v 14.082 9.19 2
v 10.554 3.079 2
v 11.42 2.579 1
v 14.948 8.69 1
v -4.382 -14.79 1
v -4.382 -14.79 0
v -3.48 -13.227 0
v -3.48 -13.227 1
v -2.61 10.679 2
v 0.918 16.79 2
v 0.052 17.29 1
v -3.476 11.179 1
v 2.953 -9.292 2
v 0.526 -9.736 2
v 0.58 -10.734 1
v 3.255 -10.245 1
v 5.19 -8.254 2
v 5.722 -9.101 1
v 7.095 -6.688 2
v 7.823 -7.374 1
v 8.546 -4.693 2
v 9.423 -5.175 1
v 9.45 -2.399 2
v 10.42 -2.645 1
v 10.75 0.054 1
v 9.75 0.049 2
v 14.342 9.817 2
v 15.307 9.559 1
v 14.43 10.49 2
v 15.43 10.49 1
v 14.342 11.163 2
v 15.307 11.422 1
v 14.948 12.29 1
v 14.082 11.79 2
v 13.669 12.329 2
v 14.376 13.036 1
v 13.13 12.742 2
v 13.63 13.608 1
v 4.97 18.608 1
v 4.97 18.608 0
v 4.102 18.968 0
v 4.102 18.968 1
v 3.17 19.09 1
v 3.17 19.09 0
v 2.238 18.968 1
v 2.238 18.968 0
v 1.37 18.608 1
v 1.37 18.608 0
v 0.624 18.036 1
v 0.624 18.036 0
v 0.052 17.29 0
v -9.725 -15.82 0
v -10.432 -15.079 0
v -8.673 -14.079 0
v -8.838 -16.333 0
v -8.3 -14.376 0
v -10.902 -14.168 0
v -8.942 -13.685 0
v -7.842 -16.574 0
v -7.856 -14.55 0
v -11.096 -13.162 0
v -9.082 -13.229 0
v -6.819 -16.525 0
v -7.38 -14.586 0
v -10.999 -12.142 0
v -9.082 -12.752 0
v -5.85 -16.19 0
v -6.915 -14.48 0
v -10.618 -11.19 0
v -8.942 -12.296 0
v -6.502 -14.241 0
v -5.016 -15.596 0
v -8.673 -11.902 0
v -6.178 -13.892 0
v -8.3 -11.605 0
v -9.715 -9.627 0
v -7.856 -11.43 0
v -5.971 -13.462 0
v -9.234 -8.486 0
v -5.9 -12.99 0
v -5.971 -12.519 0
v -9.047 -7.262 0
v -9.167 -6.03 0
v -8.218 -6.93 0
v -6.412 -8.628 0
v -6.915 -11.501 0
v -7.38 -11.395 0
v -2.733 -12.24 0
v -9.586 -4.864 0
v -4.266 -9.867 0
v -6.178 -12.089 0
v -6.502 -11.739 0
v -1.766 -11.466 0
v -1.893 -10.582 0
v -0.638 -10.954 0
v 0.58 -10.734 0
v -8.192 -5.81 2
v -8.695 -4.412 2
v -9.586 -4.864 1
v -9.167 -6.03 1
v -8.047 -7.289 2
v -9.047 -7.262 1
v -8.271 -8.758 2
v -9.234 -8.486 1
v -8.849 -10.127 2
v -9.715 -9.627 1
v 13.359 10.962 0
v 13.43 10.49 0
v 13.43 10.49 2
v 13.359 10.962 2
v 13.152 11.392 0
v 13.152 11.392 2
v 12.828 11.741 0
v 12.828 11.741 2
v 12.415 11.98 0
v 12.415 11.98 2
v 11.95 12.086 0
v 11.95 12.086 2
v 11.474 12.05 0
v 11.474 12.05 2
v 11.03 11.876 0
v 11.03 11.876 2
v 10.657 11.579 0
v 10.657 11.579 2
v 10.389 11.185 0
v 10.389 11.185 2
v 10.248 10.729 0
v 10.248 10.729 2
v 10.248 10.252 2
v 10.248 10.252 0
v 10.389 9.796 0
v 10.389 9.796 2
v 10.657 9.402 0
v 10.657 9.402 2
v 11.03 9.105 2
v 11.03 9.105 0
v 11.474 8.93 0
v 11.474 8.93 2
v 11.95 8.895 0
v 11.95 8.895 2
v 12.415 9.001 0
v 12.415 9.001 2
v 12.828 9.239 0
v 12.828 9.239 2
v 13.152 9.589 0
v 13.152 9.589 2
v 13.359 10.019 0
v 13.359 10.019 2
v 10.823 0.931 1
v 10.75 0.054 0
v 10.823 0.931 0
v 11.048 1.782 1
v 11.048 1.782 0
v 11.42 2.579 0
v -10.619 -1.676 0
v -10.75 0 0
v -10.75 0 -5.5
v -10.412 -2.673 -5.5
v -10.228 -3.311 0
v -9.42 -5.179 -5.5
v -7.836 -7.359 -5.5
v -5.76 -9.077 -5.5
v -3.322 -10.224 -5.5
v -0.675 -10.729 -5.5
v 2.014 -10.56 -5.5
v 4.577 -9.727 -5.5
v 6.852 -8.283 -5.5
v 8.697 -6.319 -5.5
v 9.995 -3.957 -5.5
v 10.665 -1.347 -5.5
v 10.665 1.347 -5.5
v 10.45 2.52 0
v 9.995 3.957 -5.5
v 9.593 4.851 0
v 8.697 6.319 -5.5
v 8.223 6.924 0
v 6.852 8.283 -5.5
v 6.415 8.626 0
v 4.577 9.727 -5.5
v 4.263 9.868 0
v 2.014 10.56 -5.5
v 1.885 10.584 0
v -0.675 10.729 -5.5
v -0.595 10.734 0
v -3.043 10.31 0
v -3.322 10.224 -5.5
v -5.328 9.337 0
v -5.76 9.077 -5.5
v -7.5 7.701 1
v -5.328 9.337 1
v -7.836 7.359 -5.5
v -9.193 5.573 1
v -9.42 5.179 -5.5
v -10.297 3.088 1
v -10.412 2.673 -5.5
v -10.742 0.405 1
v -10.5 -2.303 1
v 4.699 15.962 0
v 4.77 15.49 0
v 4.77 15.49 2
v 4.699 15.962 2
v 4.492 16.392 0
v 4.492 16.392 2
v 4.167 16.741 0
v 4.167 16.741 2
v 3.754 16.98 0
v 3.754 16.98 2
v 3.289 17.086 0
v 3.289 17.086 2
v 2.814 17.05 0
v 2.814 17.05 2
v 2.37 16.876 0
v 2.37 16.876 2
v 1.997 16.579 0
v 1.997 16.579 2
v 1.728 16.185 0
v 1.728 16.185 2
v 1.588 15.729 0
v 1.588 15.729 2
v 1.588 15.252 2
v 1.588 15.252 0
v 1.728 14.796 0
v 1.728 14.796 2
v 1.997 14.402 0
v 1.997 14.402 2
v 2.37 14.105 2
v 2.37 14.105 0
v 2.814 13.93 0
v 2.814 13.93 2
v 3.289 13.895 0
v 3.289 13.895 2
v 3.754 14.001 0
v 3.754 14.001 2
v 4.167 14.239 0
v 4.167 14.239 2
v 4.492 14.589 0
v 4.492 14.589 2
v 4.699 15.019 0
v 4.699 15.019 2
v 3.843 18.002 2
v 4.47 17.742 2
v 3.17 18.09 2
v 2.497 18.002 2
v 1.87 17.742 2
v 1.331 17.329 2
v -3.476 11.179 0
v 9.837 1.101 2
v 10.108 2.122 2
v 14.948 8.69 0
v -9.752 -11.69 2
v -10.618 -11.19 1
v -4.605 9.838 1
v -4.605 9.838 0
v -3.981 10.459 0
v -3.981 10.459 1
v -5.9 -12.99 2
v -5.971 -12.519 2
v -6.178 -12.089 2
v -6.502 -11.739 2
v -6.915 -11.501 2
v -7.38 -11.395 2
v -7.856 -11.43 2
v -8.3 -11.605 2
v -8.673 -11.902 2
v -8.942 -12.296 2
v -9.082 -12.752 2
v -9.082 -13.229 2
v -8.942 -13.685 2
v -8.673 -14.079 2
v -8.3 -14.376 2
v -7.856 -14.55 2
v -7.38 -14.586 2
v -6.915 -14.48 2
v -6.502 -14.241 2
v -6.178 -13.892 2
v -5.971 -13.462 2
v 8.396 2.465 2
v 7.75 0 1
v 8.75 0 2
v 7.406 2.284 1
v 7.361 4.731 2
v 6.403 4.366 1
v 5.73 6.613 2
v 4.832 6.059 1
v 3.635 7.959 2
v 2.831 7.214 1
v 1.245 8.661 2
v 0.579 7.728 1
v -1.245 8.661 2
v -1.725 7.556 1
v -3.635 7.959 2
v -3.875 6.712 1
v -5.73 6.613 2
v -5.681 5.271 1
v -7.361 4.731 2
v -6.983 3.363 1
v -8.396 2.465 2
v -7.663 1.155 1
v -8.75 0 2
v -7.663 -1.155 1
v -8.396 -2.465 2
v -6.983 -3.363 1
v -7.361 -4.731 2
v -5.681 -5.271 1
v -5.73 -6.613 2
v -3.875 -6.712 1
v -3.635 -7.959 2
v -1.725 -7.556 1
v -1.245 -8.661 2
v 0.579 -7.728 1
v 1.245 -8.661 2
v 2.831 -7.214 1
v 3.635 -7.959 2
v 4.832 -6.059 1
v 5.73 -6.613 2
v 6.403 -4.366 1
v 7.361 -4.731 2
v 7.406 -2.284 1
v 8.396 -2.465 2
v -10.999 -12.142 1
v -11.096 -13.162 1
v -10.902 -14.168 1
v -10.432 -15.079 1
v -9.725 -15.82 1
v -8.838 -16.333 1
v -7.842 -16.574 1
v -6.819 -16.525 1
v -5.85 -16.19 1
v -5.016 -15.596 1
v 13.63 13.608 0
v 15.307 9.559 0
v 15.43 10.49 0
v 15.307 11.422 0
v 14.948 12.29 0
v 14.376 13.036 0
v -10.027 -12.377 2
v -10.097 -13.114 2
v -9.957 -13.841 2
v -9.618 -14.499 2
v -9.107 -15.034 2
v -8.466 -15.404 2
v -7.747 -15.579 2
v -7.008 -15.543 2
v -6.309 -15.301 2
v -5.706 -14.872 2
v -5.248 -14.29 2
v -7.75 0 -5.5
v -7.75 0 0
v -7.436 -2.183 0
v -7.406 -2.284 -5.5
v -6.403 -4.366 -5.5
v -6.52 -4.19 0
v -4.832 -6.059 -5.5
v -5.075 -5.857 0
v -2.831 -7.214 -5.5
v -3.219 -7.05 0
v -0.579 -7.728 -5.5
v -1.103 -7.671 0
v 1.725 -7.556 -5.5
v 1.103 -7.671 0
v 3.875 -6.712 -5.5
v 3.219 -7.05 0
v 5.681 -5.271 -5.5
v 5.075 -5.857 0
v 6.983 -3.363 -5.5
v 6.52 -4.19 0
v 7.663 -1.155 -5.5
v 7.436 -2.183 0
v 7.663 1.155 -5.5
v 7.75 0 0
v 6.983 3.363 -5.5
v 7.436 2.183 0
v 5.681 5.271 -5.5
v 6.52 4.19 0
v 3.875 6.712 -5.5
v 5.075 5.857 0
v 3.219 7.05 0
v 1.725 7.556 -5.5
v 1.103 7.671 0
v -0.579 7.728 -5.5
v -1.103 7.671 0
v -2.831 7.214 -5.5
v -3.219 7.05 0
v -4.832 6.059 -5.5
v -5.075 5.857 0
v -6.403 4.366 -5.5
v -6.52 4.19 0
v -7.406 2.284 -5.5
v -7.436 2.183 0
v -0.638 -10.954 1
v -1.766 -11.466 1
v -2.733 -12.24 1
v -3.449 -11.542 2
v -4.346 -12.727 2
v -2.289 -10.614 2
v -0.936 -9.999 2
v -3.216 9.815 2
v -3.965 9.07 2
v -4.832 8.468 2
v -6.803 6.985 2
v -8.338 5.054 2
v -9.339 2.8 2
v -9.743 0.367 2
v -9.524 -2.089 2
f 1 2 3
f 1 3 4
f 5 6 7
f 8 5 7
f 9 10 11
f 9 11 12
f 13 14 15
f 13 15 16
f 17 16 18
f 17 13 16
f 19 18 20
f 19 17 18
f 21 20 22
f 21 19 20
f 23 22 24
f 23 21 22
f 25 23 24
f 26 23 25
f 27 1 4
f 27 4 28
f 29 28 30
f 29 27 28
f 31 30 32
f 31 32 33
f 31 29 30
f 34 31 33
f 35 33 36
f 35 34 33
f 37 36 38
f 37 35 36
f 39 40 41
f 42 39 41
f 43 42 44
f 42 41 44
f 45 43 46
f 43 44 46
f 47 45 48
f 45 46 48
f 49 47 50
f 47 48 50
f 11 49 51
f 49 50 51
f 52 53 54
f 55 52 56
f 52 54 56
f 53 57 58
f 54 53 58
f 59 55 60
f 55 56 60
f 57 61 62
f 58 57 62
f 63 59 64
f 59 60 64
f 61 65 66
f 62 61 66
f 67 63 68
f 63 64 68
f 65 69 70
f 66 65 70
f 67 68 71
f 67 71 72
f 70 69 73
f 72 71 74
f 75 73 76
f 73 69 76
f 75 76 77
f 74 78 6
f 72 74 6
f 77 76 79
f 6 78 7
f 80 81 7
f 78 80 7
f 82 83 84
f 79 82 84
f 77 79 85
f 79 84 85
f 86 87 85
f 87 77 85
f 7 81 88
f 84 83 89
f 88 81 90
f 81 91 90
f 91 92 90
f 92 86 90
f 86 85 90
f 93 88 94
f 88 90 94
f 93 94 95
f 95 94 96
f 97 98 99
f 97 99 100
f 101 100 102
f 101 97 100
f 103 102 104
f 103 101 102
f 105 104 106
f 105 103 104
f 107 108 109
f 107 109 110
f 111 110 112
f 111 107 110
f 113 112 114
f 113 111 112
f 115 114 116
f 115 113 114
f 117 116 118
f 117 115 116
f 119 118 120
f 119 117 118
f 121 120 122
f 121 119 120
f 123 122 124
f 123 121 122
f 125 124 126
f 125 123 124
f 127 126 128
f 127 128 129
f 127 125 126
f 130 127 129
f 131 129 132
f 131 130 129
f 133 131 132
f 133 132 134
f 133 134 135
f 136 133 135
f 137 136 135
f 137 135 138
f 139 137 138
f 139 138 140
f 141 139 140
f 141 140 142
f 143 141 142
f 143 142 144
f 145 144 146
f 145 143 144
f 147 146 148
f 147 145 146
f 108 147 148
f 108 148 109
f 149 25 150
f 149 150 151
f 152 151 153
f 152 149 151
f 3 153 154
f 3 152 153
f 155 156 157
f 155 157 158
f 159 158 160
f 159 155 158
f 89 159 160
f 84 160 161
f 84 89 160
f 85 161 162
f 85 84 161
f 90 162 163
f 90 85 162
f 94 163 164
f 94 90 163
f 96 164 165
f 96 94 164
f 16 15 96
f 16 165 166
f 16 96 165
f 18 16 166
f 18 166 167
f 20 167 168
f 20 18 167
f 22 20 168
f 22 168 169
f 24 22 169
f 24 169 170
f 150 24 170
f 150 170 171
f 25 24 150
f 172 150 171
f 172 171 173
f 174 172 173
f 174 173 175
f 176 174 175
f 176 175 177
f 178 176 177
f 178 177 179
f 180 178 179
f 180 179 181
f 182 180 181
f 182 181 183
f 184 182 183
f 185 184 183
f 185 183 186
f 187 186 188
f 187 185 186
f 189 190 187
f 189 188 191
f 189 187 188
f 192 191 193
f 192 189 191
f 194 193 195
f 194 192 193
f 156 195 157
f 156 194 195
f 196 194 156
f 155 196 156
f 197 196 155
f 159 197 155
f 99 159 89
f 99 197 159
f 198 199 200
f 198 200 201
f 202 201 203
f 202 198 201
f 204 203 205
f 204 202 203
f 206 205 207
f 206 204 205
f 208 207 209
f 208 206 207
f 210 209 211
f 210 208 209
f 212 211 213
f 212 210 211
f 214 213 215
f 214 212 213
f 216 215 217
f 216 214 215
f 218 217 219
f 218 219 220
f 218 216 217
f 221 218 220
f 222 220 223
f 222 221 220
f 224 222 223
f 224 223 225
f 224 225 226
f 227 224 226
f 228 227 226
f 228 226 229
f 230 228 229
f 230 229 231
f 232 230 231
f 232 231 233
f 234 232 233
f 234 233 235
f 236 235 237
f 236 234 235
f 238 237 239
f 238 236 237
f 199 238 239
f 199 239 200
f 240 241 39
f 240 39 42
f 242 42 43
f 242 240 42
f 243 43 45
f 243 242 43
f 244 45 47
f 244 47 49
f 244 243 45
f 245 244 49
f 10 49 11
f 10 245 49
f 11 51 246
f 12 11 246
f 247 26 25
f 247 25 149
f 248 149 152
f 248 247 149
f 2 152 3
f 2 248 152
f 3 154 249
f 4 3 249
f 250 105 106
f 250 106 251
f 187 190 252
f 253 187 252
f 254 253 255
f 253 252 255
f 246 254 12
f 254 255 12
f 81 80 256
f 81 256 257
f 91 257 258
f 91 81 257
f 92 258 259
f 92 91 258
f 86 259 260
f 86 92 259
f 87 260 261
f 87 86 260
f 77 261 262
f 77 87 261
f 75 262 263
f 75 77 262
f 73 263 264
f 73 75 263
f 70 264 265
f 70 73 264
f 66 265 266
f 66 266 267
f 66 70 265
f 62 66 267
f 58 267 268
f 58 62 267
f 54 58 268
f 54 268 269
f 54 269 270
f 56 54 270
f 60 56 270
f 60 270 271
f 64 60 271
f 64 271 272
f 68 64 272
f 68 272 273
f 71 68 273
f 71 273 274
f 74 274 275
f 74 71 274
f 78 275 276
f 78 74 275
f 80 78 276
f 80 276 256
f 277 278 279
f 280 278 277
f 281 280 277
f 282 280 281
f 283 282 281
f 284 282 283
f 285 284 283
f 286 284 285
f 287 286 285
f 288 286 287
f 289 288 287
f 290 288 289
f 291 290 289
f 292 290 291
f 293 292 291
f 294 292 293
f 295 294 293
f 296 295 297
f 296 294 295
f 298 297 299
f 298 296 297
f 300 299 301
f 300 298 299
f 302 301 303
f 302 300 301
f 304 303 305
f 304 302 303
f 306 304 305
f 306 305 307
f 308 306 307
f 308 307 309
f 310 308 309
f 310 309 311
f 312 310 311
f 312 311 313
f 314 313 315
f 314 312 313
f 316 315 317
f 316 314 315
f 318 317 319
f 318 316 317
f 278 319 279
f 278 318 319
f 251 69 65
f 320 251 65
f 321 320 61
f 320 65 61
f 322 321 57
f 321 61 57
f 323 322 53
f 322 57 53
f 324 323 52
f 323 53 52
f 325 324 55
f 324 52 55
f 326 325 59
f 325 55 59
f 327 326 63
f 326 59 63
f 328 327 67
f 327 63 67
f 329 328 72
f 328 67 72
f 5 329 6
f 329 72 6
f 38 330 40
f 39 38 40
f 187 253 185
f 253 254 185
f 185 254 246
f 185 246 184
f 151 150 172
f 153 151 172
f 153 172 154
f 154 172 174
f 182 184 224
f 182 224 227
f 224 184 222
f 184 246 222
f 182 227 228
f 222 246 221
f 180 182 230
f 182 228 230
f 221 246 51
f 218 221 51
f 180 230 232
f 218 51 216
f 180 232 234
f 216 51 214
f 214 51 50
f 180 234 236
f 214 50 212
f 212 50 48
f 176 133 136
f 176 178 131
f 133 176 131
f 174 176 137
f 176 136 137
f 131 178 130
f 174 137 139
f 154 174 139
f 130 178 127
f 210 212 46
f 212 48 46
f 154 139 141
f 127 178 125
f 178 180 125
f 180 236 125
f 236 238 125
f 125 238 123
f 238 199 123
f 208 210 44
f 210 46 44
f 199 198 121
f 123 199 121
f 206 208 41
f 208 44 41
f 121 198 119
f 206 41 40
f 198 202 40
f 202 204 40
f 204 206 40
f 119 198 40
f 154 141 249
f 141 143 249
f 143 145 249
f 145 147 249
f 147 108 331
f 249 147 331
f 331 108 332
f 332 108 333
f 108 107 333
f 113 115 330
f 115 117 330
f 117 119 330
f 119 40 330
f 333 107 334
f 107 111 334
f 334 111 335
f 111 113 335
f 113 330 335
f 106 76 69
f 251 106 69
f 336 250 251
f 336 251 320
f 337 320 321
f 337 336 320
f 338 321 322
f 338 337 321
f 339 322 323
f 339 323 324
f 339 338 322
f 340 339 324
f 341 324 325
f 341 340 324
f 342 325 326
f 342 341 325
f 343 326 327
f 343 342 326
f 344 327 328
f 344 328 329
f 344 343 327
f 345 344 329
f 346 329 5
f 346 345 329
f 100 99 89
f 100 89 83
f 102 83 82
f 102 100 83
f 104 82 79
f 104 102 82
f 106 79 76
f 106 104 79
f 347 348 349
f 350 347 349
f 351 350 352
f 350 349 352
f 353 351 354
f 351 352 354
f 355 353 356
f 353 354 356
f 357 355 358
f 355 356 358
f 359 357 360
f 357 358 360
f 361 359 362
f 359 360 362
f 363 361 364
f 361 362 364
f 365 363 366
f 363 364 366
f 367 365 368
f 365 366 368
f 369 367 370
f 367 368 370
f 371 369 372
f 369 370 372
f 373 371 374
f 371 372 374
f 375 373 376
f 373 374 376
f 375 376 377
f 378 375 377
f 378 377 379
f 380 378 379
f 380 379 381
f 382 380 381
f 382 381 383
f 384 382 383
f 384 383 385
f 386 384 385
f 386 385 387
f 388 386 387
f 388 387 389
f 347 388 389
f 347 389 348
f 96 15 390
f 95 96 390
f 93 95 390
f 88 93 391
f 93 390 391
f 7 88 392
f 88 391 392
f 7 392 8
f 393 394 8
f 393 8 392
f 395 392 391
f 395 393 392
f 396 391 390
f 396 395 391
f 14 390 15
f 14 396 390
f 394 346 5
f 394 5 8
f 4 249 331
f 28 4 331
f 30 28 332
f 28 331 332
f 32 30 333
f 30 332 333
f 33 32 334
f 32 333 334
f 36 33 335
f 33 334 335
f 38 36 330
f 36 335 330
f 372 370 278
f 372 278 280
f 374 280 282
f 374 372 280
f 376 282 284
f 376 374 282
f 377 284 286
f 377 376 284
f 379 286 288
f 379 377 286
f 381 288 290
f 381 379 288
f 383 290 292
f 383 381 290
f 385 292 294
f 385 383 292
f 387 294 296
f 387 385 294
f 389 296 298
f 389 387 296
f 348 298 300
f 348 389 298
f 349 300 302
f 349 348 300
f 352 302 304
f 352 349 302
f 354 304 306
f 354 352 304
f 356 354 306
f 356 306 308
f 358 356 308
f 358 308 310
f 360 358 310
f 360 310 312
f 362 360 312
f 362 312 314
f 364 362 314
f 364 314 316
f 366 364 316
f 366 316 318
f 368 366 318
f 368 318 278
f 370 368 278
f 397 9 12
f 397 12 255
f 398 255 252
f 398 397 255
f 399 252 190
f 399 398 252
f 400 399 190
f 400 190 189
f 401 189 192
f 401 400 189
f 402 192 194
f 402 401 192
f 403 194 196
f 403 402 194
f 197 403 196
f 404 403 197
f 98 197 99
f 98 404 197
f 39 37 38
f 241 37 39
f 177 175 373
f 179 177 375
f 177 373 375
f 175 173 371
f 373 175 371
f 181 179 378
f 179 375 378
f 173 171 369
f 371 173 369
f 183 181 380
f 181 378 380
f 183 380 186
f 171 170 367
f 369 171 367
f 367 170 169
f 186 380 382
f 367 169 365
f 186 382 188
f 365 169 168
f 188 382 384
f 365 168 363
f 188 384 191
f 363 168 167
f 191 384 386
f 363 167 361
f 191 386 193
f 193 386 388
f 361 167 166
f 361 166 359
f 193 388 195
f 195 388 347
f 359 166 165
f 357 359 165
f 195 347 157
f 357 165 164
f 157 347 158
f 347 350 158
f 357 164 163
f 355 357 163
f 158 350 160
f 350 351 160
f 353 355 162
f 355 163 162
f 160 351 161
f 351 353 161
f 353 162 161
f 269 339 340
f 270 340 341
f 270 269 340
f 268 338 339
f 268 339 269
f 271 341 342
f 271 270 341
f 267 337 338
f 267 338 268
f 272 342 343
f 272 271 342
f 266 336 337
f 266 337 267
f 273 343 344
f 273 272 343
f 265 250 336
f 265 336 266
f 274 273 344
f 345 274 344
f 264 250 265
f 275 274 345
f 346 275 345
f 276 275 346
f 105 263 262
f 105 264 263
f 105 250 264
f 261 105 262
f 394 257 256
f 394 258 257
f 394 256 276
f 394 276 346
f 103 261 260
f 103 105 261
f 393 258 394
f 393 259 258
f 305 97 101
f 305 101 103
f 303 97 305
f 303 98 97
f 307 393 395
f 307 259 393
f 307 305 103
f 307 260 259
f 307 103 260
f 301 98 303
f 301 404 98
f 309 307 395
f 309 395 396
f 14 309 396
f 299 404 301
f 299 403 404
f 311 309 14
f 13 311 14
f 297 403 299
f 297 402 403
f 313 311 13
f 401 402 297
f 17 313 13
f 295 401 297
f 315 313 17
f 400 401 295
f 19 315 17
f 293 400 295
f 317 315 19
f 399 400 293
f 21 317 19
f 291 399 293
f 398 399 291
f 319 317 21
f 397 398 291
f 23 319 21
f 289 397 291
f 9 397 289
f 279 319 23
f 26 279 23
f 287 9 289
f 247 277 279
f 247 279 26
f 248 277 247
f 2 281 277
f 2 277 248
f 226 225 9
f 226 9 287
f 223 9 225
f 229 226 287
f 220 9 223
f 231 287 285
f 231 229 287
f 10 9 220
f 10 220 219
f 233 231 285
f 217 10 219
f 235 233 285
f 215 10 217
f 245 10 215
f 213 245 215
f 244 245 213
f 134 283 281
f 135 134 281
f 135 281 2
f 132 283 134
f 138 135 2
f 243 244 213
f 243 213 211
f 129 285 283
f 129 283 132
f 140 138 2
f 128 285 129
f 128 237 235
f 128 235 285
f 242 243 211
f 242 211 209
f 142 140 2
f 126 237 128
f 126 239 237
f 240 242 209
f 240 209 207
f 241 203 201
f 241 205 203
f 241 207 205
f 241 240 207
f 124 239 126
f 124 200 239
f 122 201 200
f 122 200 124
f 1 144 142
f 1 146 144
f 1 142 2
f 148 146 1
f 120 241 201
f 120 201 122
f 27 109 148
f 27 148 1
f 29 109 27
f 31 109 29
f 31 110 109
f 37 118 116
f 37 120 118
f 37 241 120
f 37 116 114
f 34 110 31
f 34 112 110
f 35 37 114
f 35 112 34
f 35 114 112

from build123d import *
from build123d.topology import SkipClean

# Parameters (mm, degrees)
SKETCH1_R           = 1.6
SKETCH1_R_2         = 10.75
SKETCH1_R_3         = 7.75
BOSS_EXTRUDE1_DEPTH = 2
SKETCH1_3_R         = 10.75
SKETCH1_3_R_2       = 7.75
BOSS_EXTRUDE2_DEPTH = 5.5
FILLET1_R           = 5
CHAMFER1_SIZE       = 1


with BuildPart() as part:
    # Sketch1 → Boss-Extrude1 (new body)
    with BuildSketch(Plane.XY):
        with BuildLine():
            ThreePointArc((-1.946953154, -10.572221782), (-5.375, -9.309773091), (-8.182336061, -6.972221782))
            Line((-8.182336061, -6.972221782), (-10.617691454, -11.190381057))
            ThreePointArc((-10.617691454, -11.190381057), (-9.3, -16.10807251), (-4.382308546, -14.790381057))
            Line((-4.382308546, -14.790381057), (-1.946953154, -10.572221782))
        make_face()
        with Locations((-7.5, -12.990381057)):
            Circle(SKETCH1_R, mode=Mode.SUBTRACT)
        with BuildLine():
            Line((13.630127019, 13.60807251), (4.969872981, 18.60807251))
            ThreePointArc((4.969872981, 18.60807251), (2.238124419, 18.967714031), (0.052181527, 17.290381057))
            Line((0.052181527, 17.290381057), (-4.222818473, 9.885863854))
            ThreePointArc((-4.222818473, 9.885863854), (5.375, 9.309773091), (10.672818473, 1.285863854))
            Line((10.672818473, 1.285863854), (14.947818473, 8.690381057))
            ThreePointArc((14.947818473, 8.690381057), (15.307459994, 11.422129619), (13.630127019, 13.60807251))
        make_face()
        with Locations((3.169872981, 15.490381057)):
            Circle(SKETCH1_R, mode=Mode.SUBTRACT)
        with Locations((11.830127019, 10.490381057)):
            Circle(SKETCH1_R, mode=Mode.SUBTRACT)
        Circle(SKETCH1_R_2)
        Circle(SKETCH1_R_3, mode=Mode.SUBTRACT)
    extrude(amount=BOSS_EXTRUDE1_DEPTH)

    # Sketch1<3> → Boss-Extrude2 (add)
    with SkipClean():  # the faces are left unmerged after this step: merging them gives an invalid solid
        with BuildSketch(Plane.XY):
            with Locations(Location((0, 0, 0), (0, 0, 180))):
                Circle(SKETCH1_3_R)
            with Locations(Location((0, 0, 0), (0, 0, 180))):
                Circle(SKETCH1_3_R_2, mode=Mode.SUBTRACT)
        extrude(amount=-BOSS_EXTRUDE2_DEPTH)

    # Fillet1
    fillet1_edges = [part.edges().sort_by_distance(p)[0] for p in [
        (-8.182336061, -6.972221782, 1),
        (-4.222818473, 9.885863854, 1),
        (10.672818473, 1.285863854, 1),
        (-1.946953154, -10.572221782, 1),
    ]]
    fillet(fillet1_edges, radius=FILLET1_R)

    # Chamfer1
    chamfer1_edges = [part.edges().sort_by_distance(p)[0] for p in [
        (-10.166389113, -10.408702474, 2),
        (-9.3, -16.10807251, 2),
        (-3.931006206, -14.008702474, 2),
        (13.183745523, 5.63491708, 2),
        (15.307459994, 11.422129619, 2),
        (9.3, 16.10807251, 2),
        (2.238124419, 18.967714031, 2),
        (-1.711891422, 14.23491708, 2),
        (7.822542831, -7.373623509, 2),
        (-10.297016692, 3.08770906, 2),
        (-7.75, 0, 2),
        (-4.27948651, 10.135012665, 2),
        (-9.047037625, -7.26206095, 2),
        (-1.765610454, -11.465994887, 2),
        (10.916921691, 1.3613623, 2),
    ]]
    chamfer(chamfer1_edges, length=CHAMFER1_SIZE)


solid = part.part
